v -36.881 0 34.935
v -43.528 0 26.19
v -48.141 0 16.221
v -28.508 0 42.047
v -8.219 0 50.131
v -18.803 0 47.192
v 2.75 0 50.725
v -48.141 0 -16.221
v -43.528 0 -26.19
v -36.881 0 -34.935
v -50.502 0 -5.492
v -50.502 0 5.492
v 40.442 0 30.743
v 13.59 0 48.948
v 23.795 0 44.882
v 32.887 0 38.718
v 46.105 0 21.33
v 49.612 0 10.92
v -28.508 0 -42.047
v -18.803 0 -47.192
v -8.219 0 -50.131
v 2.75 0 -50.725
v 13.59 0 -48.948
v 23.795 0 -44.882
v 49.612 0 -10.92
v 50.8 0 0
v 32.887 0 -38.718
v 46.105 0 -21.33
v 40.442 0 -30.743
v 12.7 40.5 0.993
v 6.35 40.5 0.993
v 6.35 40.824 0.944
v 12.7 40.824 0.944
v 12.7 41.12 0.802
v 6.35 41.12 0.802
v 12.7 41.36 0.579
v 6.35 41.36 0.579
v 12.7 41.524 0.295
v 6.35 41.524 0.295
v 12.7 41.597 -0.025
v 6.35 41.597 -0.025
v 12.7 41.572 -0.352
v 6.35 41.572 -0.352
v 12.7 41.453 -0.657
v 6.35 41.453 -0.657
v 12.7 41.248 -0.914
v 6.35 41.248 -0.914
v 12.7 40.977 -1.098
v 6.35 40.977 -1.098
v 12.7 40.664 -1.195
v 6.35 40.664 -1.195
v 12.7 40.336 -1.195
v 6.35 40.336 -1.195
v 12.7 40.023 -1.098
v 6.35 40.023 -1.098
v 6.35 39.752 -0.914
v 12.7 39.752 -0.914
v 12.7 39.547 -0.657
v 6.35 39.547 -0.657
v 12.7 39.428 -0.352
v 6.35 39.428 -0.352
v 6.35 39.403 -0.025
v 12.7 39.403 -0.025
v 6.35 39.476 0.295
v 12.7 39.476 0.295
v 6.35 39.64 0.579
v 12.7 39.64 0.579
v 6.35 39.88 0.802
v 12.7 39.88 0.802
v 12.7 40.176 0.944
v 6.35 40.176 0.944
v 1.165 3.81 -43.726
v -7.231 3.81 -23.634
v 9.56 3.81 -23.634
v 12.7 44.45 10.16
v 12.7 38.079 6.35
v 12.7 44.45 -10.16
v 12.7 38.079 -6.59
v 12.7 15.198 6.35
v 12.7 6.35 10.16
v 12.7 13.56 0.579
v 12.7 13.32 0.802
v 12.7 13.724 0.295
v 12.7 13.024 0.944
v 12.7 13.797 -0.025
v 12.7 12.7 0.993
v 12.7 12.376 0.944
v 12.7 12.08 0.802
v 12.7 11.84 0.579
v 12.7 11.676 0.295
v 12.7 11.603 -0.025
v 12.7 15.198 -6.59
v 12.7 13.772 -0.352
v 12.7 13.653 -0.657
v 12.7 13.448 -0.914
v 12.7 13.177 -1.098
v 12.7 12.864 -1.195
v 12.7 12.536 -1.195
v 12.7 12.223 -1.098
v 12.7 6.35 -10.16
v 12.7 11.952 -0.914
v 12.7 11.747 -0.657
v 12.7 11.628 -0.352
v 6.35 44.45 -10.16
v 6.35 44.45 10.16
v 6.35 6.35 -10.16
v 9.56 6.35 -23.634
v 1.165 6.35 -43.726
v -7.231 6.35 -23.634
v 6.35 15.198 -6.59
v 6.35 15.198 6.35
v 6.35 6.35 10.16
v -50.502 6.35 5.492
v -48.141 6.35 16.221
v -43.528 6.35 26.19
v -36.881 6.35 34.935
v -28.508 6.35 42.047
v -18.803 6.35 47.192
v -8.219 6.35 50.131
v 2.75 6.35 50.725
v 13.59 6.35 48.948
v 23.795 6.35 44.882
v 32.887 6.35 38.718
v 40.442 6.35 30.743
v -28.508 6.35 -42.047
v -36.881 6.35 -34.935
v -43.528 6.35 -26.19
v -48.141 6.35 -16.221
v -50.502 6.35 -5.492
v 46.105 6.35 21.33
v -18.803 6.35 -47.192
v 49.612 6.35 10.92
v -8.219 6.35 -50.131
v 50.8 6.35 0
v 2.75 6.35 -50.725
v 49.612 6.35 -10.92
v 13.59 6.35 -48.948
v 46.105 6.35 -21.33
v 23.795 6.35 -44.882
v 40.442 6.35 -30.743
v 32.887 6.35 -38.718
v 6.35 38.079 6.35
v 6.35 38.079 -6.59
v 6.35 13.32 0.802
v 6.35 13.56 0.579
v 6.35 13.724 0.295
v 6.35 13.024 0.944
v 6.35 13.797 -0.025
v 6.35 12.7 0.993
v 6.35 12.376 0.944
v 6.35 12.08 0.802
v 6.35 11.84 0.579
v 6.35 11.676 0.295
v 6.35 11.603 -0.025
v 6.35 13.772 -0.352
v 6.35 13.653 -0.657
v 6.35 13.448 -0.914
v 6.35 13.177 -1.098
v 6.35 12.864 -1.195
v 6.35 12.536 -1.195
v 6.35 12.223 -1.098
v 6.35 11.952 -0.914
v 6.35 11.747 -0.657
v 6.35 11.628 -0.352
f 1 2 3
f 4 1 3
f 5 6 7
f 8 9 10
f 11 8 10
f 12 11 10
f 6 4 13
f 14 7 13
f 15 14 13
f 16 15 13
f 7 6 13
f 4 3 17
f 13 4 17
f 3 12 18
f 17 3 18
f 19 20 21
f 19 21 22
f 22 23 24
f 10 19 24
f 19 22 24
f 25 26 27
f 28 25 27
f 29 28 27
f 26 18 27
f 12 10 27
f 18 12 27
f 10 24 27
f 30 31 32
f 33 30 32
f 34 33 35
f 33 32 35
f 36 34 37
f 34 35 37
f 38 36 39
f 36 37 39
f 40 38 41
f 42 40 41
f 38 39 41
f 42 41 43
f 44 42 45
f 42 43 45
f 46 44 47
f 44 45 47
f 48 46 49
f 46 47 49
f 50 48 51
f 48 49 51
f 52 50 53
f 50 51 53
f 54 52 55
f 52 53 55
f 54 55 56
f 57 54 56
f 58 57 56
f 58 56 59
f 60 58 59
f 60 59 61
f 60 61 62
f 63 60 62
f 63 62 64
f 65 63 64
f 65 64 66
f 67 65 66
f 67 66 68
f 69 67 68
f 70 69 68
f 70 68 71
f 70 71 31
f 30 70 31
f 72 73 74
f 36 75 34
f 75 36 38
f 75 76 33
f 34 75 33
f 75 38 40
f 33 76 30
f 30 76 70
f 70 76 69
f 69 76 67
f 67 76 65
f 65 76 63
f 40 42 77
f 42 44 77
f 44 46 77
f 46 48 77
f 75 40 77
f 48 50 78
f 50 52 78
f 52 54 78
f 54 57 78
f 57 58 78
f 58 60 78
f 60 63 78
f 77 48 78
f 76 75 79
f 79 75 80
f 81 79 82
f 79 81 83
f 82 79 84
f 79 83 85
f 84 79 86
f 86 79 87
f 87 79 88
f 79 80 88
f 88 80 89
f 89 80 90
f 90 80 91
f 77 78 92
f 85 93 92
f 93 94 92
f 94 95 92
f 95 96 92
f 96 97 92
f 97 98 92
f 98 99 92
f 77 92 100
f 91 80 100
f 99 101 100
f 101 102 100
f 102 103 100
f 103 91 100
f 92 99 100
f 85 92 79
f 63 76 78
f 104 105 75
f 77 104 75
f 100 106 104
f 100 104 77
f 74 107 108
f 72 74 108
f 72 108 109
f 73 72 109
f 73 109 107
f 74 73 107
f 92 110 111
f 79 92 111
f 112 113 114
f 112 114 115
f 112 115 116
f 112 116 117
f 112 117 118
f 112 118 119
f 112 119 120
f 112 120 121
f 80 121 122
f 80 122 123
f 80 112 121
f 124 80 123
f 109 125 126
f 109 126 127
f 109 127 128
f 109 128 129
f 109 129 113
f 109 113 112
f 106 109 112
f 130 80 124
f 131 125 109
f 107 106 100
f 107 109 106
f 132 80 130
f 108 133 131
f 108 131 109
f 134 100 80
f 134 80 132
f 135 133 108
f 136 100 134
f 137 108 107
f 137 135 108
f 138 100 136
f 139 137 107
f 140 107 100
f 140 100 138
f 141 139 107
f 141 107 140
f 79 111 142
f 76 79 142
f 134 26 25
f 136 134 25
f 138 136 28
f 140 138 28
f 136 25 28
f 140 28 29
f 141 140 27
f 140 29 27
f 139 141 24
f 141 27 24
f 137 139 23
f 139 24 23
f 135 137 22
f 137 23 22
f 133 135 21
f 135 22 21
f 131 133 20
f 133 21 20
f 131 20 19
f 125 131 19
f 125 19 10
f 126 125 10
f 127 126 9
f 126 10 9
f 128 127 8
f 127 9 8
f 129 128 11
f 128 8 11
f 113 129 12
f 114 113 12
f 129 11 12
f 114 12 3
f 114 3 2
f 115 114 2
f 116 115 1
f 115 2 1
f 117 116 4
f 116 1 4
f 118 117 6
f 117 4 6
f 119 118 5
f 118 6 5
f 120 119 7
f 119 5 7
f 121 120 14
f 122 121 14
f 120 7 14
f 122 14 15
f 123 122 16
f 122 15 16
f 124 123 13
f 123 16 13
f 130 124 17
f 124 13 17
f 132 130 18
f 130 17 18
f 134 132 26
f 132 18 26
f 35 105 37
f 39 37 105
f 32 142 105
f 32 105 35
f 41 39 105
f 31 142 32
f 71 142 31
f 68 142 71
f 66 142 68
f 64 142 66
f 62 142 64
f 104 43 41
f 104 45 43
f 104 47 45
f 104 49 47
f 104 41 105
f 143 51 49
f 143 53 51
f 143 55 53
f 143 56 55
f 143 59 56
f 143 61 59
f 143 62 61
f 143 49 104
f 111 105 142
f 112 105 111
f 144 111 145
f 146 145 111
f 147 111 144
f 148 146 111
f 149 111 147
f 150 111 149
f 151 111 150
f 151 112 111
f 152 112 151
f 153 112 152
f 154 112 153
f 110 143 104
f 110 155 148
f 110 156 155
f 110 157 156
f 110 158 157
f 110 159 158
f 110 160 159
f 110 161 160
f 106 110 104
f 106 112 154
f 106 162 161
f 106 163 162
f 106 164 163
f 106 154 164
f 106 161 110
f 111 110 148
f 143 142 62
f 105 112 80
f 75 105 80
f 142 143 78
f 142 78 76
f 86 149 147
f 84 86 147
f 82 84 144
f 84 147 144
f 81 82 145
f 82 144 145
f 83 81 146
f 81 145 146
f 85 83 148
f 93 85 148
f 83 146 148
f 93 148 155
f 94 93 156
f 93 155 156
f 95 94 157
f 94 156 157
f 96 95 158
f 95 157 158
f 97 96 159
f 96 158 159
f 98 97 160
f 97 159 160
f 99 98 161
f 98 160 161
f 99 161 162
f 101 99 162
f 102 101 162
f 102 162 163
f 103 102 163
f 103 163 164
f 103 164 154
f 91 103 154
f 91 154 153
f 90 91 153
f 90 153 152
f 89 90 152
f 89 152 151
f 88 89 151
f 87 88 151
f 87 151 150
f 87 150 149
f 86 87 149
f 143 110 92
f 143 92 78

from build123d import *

# Parameters (mm, degrees)
SKETCH1_R           = 50.8
BOSS_EXTRUDE1_DEPTH = 6.35
SKETCH2_W           = 6.35
SKETCH2_H           = 20.32
BOSS_EXTRUDE2_DEPTH = 38.1
SKETCH3_R           = 1.1
SKETCH3_W           = 12.939919869
SKETCH3_H           = 22.881654632
CUT_EXTRUDE1_DEPTH  = 12.7
CUT_EXTRUDE2_DEPTH  = 2.54


with BuildPart() as part:
    # Sketch1 → Boss-Extrude1 (new body)
    with BuildSketch(Plane(origin=(0, 0, 0), x_dir=(1, 0, 0), z_dir=(0, 1, 0))):
        Circle(SKETCH1_R)
    extrude(amount=BOSS_EXTRUDE1_DEPTH)

    # Sketch2 → Boss-Extrude2 (add)
    with BuildSketch(Plane(origin=(0, 6.35, 0), x_dir=(1, 0, 0), z_dir=(0, 1, 0))):
        with Locations((9.525, 0)):
            Rectangle(SKETCH2_W, SKETCH2_H)
    extrude(amount=BOSS_EXTRUDE2_DEPTH)

    # Sketch3 → Cut-Extrude1 (cut)
    with BuildSketch(Plane(origin=(6.35, 55.246794414, 64.642959957), x_dir=(0, 0, 1), z_dir=(-1, 0, 0))):
        with Locations((-64.750269074, -14.746794414)):
            Circle(SKETCH3_R)
        with Locations((-64.750269074, -42.546794414)):
            Circle(SKETCH3_R)
        with Locations((-64.762919892, -28.608275818)):
            Rectangle(SKETCH3_W, SKETCH3_H)
    extrude(amount=-CUT_EXTRUDE1_DEPTH, mode=Mode.SUBTRACT)

    # Sketch4 → Cut-Extrude2 (cut)
    with BuildSketch(Plane(origin=(0, 6.35, 0), x_dir=(1, 0, 0), z_dir=(0, 1, 0))):
        Polygon((-7.230978109, 23.634136505), (9.560420722, 23.634136505), (1.164721306, 43.725579037), align=None)
    extrude(amount=-CUT_EXTRUDE2_DEPTH, mode=Mode.SUBTRACT)


solid = part.part
